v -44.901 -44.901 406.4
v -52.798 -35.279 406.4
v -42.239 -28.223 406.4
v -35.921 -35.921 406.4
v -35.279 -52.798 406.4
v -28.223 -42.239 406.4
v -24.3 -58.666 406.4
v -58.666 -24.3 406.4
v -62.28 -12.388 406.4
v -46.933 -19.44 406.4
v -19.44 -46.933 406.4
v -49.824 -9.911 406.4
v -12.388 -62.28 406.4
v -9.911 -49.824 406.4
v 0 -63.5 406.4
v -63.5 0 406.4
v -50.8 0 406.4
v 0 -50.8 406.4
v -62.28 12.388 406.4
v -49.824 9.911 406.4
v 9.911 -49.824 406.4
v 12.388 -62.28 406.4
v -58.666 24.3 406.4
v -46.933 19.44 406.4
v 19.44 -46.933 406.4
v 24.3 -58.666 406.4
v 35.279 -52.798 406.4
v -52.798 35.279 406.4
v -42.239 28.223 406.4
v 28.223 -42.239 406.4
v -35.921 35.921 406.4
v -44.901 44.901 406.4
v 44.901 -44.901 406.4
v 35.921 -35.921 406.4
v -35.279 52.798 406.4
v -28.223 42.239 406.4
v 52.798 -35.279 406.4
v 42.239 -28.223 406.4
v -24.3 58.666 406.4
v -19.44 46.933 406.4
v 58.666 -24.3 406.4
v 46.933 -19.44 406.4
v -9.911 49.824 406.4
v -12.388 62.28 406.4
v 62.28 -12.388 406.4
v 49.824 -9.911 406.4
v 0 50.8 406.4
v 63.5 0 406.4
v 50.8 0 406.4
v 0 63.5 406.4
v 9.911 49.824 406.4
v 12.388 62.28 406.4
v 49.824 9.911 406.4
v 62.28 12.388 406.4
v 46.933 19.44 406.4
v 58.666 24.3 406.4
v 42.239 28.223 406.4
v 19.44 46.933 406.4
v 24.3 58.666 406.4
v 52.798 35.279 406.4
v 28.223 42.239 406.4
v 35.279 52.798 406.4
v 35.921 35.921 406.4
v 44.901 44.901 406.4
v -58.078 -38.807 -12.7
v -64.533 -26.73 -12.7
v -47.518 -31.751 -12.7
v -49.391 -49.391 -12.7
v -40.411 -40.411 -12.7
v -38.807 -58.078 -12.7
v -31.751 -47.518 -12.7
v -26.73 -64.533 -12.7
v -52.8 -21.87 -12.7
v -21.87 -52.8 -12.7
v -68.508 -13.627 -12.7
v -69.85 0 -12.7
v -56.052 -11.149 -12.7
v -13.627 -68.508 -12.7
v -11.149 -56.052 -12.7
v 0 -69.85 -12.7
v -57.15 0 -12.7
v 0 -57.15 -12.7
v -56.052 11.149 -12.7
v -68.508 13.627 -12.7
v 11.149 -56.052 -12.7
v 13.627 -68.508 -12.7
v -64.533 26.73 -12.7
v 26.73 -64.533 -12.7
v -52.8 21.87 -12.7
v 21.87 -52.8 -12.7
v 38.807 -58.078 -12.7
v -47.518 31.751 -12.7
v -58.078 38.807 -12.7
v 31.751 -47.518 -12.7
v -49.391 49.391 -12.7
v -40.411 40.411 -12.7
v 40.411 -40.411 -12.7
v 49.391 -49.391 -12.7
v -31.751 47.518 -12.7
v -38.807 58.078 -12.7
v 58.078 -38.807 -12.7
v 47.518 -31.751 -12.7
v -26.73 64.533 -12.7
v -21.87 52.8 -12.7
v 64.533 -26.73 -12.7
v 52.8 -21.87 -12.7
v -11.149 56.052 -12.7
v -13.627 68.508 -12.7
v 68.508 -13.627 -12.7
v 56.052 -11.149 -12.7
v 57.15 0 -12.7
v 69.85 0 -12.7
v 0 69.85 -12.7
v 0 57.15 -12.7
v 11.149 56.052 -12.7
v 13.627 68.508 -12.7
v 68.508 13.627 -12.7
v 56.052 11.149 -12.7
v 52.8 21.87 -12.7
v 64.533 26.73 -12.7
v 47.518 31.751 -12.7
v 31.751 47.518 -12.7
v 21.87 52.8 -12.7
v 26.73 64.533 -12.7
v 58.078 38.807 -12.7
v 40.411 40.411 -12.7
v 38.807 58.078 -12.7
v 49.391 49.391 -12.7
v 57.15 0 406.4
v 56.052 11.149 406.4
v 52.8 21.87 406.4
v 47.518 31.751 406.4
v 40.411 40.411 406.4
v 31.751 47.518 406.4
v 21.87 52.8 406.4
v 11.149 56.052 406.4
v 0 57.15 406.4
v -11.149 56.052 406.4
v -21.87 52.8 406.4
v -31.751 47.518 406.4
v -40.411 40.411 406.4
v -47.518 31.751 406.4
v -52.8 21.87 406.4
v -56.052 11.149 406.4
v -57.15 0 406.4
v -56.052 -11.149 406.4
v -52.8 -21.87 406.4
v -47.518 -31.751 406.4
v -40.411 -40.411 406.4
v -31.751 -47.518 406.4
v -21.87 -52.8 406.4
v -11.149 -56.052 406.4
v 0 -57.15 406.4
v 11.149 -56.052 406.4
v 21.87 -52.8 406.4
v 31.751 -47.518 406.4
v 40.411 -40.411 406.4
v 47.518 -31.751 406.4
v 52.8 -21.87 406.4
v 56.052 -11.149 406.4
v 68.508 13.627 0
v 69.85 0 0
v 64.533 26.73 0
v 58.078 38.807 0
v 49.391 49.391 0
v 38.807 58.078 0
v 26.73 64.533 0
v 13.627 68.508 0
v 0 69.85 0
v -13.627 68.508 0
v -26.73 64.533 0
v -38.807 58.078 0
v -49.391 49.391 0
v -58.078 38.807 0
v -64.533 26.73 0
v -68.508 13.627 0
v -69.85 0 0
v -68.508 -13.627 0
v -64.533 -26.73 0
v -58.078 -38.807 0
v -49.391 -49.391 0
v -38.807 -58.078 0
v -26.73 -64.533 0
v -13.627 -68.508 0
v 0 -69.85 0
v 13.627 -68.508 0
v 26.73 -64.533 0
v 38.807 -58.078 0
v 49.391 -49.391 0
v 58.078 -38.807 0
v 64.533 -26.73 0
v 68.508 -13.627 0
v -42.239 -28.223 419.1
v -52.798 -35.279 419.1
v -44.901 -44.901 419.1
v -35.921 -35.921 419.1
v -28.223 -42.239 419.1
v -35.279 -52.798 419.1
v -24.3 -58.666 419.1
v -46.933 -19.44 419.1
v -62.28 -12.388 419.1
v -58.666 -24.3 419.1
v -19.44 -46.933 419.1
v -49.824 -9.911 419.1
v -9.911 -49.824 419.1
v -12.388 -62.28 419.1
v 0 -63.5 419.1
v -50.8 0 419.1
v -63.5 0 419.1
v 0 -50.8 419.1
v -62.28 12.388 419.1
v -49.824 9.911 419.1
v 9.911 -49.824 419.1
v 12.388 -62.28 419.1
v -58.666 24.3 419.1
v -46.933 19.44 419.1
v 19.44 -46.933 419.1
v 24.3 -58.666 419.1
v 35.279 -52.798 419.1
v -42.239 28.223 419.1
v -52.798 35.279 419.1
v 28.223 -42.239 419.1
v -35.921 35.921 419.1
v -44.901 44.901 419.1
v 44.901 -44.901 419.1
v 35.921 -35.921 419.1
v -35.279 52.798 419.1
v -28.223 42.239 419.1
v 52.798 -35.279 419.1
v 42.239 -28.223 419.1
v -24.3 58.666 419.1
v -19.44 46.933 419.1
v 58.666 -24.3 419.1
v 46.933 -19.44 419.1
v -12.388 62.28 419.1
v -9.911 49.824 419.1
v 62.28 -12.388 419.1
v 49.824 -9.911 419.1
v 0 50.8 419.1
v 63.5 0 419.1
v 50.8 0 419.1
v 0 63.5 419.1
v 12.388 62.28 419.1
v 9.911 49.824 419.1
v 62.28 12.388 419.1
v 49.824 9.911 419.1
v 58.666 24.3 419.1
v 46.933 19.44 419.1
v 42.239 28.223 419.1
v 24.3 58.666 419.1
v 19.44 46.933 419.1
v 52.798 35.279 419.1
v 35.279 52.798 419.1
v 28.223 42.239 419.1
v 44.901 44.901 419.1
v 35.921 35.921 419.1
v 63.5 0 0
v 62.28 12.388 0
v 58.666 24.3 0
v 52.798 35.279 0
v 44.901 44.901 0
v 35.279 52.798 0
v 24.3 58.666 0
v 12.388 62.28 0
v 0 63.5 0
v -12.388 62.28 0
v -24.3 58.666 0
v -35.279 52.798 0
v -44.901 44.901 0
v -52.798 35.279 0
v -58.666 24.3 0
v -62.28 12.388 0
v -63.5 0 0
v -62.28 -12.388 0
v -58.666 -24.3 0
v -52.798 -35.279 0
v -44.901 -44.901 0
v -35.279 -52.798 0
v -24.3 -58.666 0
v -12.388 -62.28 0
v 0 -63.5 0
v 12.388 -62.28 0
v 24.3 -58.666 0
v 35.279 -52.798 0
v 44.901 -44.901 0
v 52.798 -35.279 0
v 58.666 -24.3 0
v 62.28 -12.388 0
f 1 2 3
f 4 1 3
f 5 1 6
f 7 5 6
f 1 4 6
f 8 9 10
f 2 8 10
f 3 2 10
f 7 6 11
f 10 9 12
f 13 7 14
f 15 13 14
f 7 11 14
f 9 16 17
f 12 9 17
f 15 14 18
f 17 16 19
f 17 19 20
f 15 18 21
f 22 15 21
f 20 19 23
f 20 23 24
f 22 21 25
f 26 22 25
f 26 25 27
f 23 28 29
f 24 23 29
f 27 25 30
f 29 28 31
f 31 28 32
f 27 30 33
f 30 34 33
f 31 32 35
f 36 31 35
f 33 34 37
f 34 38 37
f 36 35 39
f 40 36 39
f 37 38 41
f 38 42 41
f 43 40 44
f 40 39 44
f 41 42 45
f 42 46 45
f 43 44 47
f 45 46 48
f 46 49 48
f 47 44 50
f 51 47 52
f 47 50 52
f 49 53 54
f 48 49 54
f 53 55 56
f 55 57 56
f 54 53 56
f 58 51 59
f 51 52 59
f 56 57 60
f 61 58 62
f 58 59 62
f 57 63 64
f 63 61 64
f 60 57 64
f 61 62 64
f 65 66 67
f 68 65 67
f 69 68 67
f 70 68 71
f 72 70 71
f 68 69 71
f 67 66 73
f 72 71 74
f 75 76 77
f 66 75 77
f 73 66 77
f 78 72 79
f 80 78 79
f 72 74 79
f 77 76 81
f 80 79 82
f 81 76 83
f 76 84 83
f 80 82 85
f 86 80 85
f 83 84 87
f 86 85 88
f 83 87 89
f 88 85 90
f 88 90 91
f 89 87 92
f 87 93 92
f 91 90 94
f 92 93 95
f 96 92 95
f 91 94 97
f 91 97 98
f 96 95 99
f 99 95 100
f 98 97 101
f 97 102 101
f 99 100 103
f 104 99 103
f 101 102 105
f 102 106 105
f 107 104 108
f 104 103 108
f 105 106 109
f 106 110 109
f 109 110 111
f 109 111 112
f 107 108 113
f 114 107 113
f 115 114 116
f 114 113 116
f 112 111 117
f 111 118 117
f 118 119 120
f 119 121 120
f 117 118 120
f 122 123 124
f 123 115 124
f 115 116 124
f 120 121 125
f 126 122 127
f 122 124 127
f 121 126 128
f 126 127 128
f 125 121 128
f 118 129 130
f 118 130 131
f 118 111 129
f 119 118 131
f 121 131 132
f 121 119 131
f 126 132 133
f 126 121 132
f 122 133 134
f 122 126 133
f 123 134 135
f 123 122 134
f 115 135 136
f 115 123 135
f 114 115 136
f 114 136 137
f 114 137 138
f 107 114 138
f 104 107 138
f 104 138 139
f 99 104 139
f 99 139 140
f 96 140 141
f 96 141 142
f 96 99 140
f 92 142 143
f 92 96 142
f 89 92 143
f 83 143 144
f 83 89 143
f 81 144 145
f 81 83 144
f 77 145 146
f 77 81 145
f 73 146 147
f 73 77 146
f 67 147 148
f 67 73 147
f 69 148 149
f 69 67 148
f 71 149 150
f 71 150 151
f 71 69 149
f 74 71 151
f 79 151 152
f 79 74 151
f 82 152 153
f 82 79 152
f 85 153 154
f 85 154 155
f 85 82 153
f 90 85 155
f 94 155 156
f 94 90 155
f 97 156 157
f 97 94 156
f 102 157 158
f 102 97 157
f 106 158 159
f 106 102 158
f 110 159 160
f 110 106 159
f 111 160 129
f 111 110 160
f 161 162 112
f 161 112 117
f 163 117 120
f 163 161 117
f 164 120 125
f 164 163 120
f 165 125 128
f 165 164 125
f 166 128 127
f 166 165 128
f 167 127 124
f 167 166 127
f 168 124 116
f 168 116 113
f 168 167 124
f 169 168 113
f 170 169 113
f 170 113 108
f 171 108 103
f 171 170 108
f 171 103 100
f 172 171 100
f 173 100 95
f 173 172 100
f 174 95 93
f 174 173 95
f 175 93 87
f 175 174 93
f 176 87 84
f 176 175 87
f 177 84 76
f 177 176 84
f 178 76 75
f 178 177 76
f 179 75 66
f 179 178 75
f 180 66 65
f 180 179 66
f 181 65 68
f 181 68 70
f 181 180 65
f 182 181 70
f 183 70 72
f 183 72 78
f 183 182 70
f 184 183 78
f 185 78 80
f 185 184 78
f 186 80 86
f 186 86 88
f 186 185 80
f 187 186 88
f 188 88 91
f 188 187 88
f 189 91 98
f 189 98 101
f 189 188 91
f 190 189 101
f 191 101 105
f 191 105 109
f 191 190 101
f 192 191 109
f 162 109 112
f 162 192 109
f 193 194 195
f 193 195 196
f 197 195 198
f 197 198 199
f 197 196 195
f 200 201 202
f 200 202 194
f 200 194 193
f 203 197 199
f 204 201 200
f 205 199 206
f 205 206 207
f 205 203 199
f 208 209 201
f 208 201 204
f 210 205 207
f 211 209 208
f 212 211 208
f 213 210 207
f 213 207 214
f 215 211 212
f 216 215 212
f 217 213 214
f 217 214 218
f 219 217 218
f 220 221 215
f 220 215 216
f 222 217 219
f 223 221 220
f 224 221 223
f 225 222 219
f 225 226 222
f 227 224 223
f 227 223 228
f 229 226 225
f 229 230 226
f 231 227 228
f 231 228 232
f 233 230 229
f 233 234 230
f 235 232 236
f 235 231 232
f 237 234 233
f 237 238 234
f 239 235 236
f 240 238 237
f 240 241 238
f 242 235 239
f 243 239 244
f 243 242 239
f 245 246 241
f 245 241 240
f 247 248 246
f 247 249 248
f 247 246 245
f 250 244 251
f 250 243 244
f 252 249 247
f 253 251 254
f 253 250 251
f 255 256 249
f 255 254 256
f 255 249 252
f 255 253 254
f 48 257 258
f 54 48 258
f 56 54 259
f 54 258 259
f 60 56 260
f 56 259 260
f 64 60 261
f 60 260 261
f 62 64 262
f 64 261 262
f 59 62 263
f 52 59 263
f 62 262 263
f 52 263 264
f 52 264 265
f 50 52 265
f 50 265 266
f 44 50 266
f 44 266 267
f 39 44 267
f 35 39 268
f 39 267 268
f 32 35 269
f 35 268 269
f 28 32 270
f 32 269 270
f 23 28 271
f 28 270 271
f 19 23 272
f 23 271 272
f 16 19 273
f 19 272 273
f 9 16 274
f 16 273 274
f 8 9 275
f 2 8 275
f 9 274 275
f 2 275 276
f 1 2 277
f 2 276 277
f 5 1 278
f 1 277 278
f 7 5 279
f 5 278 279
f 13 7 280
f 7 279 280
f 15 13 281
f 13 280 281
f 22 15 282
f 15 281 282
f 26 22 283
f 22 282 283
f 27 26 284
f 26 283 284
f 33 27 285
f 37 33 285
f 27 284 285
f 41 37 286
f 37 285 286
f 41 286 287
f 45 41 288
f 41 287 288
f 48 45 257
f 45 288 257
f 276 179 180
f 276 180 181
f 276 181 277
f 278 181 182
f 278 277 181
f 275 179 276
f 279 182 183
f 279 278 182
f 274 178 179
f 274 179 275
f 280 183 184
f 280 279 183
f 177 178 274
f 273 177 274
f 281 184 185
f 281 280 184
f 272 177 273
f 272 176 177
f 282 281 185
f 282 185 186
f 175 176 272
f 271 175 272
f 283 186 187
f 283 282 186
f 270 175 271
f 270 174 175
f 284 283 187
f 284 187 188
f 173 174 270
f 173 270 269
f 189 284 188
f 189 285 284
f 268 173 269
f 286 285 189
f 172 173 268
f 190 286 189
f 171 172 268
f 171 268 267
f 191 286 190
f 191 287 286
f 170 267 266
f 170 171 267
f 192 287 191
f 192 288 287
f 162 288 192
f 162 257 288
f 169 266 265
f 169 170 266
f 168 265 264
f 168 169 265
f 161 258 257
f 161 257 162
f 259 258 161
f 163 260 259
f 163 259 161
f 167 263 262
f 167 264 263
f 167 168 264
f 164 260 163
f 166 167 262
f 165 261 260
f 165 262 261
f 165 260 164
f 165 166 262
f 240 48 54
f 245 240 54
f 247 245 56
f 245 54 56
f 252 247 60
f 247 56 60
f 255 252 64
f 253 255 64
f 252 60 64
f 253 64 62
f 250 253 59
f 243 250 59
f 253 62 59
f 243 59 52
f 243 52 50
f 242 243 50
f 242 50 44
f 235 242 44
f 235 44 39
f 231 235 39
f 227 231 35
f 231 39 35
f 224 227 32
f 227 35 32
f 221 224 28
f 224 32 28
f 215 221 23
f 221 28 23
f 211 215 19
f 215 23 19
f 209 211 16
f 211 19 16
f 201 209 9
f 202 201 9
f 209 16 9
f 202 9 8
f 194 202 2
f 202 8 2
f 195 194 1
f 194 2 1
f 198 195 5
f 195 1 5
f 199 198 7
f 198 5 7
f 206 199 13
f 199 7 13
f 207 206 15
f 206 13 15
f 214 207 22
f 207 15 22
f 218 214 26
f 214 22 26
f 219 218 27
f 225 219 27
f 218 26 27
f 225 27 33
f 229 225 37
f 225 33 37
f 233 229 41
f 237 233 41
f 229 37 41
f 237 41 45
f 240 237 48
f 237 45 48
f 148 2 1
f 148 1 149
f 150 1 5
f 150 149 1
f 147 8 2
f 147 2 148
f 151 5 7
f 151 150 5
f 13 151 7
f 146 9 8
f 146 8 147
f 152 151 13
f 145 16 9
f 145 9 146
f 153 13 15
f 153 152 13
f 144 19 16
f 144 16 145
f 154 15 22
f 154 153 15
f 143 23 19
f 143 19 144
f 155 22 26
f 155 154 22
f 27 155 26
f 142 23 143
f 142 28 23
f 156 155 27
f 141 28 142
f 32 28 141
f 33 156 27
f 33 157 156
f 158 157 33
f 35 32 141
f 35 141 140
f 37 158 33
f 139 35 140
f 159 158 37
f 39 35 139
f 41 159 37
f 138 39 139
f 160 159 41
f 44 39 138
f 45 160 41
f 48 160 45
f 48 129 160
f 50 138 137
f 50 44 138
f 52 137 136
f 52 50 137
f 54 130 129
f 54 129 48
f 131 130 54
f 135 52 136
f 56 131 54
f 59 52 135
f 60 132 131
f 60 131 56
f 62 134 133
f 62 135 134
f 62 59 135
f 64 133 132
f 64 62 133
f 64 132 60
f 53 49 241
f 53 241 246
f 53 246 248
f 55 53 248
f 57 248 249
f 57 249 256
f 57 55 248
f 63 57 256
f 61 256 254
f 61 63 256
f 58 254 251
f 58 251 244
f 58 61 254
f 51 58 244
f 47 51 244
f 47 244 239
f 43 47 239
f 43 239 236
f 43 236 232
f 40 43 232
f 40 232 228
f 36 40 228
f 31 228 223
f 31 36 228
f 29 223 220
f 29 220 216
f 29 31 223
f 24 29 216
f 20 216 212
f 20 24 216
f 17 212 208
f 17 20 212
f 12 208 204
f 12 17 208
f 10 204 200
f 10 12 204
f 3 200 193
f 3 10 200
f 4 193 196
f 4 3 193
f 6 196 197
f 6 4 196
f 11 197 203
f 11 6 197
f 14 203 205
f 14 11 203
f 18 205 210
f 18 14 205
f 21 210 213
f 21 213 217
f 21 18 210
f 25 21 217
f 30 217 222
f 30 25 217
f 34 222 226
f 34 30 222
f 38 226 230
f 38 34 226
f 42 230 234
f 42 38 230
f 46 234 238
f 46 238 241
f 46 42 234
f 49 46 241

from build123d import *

# Parameters (mm, degrees)
SKETCH1_R           = 69.85
SKETCH1_R_2         = 57.15
BOSS_EXTRUDE1_DEPTH = 12.7
BOSS_EXTRUDE2_START = 406.4
SKETCH1_3_R         = 63.5
SKETCH1_3_R_2       = 57.15
BOSS_EXTRUDE2_DEPTH = 406.4
SKETCH2_R           = 63.5
SKETCH2_R_2         = 50.8
BOSS_EXTRUDE3_DEPTH = 12.7


with BuildPart() as part:
    # Sketch1 → Boss-Extrude1 (new body)
    with BuildSketch(Plane.XY):
        Circle(SKETCH1_R)
        Circle(SKETCH1_R_2, mode=Mode.SUBTRACT)
    extrude(amount=-BOSS_EXTRUDE1_DEPTH)

    # Sketch1<3> → Boss-Extrude2 (add)
    with BuildSketch(Plane.XY.offset(BOSS_EXTRUDE2_START)):
        Circle(SKETCH1_3_R)
        Circle(SKETCH1_3_R_2, mode=Mode.SUBTRACT)
    extrude(amount=-BOSS_EXTRUDE2_DEPTH)


with BuildPart() as body_2:
    # Sketch2 → Boss-Extrude3 (new body)
    with BuildSketch(Plane.XY.offset(406.4)):
        Circle(SKETCH2_R)
        Circle(SKETCH2_R_2, mode=Mode.SUBTRACT)
    extrude(amount=BOSS_EXTRUDE3_DEPTH)


solid = Compound([part.part, body_2.part])
